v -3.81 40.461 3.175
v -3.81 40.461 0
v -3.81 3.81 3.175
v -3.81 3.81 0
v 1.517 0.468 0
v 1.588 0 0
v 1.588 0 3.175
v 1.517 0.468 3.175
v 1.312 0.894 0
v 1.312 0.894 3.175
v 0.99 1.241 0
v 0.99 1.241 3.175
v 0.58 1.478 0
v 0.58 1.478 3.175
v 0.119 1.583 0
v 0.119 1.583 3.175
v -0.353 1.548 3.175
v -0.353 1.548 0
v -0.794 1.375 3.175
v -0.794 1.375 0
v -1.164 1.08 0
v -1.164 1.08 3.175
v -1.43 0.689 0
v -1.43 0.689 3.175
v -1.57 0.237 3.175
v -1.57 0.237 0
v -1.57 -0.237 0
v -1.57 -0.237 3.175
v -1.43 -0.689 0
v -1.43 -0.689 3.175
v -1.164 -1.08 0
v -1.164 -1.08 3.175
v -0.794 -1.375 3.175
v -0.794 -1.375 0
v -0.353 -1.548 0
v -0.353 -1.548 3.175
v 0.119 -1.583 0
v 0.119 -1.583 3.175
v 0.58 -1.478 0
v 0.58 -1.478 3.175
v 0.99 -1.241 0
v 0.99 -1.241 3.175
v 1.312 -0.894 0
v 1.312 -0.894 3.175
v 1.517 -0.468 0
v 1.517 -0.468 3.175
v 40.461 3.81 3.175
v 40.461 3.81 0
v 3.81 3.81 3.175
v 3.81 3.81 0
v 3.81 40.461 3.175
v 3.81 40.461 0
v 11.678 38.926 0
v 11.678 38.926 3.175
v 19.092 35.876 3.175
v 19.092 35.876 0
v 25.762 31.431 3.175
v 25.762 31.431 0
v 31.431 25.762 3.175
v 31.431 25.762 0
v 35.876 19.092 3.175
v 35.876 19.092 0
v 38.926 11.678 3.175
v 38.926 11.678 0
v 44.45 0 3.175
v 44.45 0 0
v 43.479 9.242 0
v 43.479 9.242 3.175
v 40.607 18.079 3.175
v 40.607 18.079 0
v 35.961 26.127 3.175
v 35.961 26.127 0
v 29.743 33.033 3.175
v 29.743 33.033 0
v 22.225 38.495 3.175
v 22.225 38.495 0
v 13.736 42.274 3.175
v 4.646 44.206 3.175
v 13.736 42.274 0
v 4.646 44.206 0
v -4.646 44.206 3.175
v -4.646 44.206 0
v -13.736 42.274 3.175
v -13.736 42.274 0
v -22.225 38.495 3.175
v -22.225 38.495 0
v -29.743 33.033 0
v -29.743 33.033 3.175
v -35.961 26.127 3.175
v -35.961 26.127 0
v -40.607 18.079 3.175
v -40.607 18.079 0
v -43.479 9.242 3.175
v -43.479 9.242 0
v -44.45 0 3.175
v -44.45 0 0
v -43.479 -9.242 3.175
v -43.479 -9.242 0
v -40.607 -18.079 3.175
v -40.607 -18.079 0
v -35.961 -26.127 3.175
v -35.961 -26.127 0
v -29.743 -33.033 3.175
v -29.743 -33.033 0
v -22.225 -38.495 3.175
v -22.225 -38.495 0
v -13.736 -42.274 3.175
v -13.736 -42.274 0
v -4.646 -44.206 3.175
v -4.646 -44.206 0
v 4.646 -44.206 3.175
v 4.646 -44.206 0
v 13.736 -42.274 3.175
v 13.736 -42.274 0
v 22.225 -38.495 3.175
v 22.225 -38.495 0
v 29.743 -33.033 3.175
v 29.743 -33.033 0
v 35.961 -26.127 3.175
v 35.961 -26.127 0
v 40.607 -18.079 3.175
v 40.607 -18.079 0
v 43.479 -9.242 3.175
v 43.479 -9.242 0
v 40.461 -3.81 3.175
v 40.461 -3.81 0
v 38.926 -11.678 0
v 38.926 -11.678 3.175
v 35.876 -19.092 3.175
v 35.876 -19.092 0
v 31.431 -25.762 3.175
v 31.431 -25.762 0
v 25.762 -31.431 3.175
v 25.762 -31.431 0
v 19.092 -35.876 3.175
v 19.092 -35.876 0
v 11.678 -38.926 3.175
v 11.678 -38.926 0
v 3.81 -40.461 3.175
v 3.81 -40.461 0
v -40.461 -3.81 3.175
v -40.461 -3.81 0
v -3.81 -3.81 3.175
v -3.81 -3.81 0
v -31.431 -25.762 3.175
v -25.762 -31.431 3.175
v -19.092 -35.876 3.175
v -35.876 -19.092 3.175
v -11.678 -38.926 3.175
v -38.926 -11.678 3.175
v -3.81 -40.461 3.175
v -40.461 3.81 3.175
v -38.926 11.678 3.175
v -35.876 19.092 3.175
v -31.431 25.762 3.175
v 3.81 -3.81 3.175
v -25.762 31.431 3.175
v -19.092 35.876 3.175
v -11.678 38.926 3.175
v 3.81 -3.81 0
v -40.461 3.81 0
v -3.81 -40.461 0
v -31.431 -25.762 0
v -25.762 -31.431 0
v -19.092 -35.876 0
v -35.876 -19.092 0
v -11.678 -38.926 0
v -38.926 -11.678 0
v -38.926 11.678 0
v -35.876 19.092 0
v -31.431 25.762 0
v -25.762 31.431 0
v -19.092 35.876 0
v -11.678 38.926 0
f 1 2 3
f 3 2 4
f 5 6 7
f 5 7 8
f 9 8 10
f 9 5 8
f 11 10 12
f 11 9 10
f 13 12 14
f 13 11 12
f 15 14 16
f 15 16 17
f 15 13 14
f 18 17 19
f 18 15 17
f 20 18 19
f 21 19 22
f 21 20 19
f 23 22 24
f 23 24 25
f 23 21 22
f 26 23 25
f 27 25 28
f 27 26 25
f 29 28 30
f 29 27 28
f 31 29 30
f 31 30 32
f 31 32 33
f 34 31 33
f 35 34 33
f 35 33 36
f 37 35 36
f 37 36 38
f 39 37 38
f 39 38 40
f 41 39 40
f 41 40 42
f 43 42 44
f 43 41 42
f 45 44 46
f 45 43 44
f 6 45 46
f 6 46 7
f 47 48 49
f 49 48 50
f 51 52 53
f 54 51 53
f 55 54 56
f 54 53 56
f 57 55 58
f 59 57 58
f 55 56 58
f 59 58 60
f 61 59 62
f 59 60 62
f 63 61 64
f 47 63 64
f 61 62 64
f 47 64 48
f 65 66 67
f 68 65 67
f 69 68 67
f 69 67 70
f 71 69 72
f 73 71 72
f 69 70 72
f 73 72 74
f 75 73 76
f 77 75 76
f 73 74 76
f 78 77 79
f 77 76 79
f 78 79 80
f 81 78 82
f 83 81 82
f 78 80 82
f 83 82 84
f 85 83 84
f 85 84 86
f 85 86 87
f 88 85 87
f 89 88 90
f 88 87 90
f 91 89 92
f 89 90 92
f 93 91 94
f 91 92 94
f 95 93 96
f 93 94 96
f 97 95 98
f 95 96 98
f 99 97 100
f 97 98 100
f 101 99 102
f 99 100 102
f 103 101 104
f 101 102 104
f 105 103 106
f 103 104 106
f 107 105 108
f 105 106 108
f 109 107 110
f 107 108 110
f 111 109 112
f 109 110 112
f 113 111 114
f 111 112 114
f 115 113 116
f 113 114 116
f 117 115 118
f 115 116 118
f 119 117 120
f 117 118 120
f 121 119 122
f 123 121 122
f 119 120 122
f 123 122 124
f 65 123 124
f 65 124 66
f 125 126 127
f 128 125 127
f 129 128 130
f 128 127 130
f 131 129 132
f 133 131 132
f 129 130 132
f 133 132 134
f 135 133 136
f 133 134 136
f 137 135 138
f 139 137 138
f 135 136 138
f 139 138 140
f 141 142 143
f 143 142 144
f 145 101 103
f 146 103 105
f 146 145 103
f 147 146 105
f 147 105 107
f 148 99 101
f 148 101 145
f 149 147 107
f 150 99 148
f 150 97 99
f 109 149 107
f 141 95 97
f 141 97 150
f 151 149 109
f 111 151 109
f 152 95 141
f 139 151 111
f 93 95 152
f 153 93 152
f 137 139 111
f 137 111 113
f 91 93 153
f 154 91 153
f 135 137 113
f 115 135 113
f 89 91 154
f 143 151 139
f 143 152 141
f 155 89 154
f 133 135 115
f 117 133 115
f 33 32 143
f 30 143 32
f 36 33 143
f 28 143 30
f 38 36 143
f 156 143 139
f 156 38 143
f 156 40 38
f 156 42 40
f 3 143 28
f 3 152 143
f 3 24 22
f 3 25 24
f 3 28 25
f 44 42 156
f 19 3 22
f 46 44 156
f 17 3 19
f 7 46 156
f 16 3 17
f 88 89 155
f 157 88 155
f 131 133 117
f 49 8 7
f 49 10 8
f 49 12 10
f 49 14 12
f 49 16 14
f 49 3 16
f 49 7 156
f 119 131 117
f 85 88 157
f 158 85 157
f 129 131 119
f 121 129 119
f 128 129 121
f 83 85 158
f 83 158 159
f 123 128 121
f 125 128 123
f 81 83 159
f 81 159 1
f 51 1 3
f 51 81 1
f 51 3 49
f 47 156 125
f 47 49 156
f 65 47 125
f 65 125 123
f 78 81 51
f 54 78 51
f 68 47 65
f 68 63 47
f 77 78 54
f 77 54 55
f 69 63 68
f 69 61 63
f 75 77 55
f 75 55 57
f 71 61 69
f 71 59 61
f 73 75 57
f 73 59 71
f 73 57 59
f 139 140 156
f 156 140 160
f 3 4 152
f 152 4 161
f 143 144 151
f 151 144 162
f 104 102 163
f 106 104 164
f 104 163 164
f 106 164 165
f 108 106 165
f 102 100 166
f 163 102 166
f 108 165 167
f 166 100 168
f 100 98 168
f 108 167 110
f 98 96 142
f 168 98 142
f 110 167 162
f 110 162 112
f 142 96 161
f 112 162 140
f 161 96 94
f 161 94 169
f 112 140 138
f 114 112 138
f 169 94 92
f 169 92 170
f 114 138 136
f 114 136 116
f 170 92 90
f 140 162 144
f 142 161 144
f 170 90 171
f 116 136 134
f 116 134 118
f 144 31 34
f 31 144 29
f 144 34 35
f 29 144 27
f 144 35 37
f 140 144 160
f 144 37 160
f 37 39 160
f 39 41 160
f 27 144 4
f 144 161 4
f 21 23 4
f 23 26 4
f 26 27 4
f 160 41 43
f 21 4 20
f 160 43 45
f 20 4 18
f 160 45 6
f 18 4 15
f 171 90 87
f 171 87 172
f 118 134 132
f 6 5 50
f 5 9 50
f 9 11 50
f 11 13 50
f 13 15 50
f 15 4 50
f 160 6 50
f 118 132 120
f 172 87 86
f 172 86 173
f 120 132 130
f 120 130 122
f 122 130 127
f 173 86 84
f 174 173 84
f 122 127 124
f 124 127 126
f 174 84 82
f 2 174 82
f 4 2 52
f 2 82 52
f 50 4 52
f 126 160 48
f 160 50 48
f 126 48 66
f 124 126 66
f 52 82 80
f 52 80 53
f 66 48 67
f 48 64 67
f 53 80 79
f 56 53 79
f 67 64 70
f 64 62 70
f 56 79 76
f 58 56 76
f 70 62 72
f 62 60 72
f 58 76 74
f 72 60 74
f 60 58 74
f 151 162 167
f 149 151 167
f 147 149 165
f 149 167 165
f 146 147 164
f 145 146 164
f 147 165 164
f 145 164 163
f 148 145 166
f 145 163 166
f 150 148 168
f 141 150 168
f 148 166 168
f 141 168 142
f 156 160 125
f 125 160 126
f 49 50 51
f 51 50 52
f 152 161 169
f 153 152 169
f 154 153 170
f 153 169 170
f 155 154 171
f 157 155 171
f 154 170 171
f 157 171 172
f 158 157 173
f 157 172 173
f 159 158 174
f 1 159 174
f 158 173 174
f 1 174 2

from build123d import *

# Parameters (mm, degrees)
F0_R     = 44.45
F0_R_2   = 1.5875
F1_DEPTH = 3.175


# Not quite as in the source:
# - a length typed as a fraction of an inch, garbled in the dataset ("3 / 203.2 mm" for 3/8 in), is restored


with BuildPart() as f1:
    # F0 (on Top) → F1 (new body)
    with BuildSketch(Plane.XY):
        Circle(F0_R)
        with BuildLine():
            ThreePointArc((40.4610120981, 3.81), (40.5952283629, 1.9071009851), (40.64, 0))
            ThreePointArc((40.64, 0), (40.5952283629, -1.9071009851), (40.4610120981, -3.81))
            ThreePointArc((40.4610120981, -3.81), (28.7368195874, -28.7368195874), (3.81, -40.4610120981))
            ThreePointArc((3.81, -40.4610120981), (0, -40.64), (-3.81, -40.4610120981))
            ThreePointArc((-3.81, -40.4610120981), (-28.7368195874, -28.7368195874), (-40.4610120981, -3.81))
            ThreePointArc((-40.4610120981, -3.81), (-40.64, 0), (-40.4610120981, 3.81))
            ThreePointArc((-40.4610120981, 3.81), (-28.7368195874, 28.7368195874), (-3.81, 40.4610120981))
            ThreePointArc((-3.81, 40.4610120981), (0, 40.64), (3.81, 40.4610120981))
            ThreePointArc((3.81, 40.4610120981), (28.7368195874, 28.7368195874), (40.4610120981, 3.81))
        make_face(mode=Mode.SUBTRACT)
        with BuildLine():
            ThreePointArc((40.4610120981, -3.81), (40.5952283629, -1.9071009851), (40.64, 0))
            ThreePointArc((40.64, 0), (40.5952283629, 1.9071009851), (40.4610120981, 3.81))
            Line((40.4610120981, 3.81), (3.81, 3.81))
            Line((3.81, 3.81), (3.81, 0))
            Line((3.81, 0), (3.81, -3.81))
            Line((3.81, -3.81), (40.4610120981, -3.81))
        make_face()
        with BuildLine():
            Line((3.81, 3.81), (3.81, 40.4610120981))
            ThreePointArc((3.81, 40.4610120981), (0, 40.64), (-3.81, 40.4610120981))
            Line((-3.81, 40.4610120981), (-3.81, 3.81))
            Line((-3.81, 3.81), (0, 3.81))
            Line((0, 3.81), (3.81, 3.81))
        make_face()
        Polygon((3.81, 0), (3.81, 3.81), (0, 3.81), (-3.81, 3.81), (-3.81, 0), (-3.81, -3.81), (0, -3.81), (3.81, -3.81), align=None)
        Circle(F0_R_2, mode=Mode.SUBTRACT)
        with BuildLine():
            ThreePointArc((-3.81, -40.4610120981), (0, -40.64), (3.81, -40.4610120981))
            Line((3.81, -40.4610120981), (3.81, -3.81))
            Line((3.81, -3.81), (0, -3.81))
            Line((0, -3.81), (-3.81, -3.81))
            Line((-3.81, -3.81), (-3.81, -40.4610120981))
        make_face()
        with BuildLine():
            Line((-3.81, 3.81), (-40.4610120981, 3.81))
            ThreePointArc((-40.4610120981, 3.81), (-40.64, 0), (-40.4610120981, -3.81))
            Line((-40.4610120981, -3.81), (-3.81, -3.81))
            Line((-3.81, -3.81), (-3.81, 0))
            Line((-3.81, 0), (-3.81, 3.81))
        make_face()
    extrude(amount=F1_DEPTH)


solid = f1.part
